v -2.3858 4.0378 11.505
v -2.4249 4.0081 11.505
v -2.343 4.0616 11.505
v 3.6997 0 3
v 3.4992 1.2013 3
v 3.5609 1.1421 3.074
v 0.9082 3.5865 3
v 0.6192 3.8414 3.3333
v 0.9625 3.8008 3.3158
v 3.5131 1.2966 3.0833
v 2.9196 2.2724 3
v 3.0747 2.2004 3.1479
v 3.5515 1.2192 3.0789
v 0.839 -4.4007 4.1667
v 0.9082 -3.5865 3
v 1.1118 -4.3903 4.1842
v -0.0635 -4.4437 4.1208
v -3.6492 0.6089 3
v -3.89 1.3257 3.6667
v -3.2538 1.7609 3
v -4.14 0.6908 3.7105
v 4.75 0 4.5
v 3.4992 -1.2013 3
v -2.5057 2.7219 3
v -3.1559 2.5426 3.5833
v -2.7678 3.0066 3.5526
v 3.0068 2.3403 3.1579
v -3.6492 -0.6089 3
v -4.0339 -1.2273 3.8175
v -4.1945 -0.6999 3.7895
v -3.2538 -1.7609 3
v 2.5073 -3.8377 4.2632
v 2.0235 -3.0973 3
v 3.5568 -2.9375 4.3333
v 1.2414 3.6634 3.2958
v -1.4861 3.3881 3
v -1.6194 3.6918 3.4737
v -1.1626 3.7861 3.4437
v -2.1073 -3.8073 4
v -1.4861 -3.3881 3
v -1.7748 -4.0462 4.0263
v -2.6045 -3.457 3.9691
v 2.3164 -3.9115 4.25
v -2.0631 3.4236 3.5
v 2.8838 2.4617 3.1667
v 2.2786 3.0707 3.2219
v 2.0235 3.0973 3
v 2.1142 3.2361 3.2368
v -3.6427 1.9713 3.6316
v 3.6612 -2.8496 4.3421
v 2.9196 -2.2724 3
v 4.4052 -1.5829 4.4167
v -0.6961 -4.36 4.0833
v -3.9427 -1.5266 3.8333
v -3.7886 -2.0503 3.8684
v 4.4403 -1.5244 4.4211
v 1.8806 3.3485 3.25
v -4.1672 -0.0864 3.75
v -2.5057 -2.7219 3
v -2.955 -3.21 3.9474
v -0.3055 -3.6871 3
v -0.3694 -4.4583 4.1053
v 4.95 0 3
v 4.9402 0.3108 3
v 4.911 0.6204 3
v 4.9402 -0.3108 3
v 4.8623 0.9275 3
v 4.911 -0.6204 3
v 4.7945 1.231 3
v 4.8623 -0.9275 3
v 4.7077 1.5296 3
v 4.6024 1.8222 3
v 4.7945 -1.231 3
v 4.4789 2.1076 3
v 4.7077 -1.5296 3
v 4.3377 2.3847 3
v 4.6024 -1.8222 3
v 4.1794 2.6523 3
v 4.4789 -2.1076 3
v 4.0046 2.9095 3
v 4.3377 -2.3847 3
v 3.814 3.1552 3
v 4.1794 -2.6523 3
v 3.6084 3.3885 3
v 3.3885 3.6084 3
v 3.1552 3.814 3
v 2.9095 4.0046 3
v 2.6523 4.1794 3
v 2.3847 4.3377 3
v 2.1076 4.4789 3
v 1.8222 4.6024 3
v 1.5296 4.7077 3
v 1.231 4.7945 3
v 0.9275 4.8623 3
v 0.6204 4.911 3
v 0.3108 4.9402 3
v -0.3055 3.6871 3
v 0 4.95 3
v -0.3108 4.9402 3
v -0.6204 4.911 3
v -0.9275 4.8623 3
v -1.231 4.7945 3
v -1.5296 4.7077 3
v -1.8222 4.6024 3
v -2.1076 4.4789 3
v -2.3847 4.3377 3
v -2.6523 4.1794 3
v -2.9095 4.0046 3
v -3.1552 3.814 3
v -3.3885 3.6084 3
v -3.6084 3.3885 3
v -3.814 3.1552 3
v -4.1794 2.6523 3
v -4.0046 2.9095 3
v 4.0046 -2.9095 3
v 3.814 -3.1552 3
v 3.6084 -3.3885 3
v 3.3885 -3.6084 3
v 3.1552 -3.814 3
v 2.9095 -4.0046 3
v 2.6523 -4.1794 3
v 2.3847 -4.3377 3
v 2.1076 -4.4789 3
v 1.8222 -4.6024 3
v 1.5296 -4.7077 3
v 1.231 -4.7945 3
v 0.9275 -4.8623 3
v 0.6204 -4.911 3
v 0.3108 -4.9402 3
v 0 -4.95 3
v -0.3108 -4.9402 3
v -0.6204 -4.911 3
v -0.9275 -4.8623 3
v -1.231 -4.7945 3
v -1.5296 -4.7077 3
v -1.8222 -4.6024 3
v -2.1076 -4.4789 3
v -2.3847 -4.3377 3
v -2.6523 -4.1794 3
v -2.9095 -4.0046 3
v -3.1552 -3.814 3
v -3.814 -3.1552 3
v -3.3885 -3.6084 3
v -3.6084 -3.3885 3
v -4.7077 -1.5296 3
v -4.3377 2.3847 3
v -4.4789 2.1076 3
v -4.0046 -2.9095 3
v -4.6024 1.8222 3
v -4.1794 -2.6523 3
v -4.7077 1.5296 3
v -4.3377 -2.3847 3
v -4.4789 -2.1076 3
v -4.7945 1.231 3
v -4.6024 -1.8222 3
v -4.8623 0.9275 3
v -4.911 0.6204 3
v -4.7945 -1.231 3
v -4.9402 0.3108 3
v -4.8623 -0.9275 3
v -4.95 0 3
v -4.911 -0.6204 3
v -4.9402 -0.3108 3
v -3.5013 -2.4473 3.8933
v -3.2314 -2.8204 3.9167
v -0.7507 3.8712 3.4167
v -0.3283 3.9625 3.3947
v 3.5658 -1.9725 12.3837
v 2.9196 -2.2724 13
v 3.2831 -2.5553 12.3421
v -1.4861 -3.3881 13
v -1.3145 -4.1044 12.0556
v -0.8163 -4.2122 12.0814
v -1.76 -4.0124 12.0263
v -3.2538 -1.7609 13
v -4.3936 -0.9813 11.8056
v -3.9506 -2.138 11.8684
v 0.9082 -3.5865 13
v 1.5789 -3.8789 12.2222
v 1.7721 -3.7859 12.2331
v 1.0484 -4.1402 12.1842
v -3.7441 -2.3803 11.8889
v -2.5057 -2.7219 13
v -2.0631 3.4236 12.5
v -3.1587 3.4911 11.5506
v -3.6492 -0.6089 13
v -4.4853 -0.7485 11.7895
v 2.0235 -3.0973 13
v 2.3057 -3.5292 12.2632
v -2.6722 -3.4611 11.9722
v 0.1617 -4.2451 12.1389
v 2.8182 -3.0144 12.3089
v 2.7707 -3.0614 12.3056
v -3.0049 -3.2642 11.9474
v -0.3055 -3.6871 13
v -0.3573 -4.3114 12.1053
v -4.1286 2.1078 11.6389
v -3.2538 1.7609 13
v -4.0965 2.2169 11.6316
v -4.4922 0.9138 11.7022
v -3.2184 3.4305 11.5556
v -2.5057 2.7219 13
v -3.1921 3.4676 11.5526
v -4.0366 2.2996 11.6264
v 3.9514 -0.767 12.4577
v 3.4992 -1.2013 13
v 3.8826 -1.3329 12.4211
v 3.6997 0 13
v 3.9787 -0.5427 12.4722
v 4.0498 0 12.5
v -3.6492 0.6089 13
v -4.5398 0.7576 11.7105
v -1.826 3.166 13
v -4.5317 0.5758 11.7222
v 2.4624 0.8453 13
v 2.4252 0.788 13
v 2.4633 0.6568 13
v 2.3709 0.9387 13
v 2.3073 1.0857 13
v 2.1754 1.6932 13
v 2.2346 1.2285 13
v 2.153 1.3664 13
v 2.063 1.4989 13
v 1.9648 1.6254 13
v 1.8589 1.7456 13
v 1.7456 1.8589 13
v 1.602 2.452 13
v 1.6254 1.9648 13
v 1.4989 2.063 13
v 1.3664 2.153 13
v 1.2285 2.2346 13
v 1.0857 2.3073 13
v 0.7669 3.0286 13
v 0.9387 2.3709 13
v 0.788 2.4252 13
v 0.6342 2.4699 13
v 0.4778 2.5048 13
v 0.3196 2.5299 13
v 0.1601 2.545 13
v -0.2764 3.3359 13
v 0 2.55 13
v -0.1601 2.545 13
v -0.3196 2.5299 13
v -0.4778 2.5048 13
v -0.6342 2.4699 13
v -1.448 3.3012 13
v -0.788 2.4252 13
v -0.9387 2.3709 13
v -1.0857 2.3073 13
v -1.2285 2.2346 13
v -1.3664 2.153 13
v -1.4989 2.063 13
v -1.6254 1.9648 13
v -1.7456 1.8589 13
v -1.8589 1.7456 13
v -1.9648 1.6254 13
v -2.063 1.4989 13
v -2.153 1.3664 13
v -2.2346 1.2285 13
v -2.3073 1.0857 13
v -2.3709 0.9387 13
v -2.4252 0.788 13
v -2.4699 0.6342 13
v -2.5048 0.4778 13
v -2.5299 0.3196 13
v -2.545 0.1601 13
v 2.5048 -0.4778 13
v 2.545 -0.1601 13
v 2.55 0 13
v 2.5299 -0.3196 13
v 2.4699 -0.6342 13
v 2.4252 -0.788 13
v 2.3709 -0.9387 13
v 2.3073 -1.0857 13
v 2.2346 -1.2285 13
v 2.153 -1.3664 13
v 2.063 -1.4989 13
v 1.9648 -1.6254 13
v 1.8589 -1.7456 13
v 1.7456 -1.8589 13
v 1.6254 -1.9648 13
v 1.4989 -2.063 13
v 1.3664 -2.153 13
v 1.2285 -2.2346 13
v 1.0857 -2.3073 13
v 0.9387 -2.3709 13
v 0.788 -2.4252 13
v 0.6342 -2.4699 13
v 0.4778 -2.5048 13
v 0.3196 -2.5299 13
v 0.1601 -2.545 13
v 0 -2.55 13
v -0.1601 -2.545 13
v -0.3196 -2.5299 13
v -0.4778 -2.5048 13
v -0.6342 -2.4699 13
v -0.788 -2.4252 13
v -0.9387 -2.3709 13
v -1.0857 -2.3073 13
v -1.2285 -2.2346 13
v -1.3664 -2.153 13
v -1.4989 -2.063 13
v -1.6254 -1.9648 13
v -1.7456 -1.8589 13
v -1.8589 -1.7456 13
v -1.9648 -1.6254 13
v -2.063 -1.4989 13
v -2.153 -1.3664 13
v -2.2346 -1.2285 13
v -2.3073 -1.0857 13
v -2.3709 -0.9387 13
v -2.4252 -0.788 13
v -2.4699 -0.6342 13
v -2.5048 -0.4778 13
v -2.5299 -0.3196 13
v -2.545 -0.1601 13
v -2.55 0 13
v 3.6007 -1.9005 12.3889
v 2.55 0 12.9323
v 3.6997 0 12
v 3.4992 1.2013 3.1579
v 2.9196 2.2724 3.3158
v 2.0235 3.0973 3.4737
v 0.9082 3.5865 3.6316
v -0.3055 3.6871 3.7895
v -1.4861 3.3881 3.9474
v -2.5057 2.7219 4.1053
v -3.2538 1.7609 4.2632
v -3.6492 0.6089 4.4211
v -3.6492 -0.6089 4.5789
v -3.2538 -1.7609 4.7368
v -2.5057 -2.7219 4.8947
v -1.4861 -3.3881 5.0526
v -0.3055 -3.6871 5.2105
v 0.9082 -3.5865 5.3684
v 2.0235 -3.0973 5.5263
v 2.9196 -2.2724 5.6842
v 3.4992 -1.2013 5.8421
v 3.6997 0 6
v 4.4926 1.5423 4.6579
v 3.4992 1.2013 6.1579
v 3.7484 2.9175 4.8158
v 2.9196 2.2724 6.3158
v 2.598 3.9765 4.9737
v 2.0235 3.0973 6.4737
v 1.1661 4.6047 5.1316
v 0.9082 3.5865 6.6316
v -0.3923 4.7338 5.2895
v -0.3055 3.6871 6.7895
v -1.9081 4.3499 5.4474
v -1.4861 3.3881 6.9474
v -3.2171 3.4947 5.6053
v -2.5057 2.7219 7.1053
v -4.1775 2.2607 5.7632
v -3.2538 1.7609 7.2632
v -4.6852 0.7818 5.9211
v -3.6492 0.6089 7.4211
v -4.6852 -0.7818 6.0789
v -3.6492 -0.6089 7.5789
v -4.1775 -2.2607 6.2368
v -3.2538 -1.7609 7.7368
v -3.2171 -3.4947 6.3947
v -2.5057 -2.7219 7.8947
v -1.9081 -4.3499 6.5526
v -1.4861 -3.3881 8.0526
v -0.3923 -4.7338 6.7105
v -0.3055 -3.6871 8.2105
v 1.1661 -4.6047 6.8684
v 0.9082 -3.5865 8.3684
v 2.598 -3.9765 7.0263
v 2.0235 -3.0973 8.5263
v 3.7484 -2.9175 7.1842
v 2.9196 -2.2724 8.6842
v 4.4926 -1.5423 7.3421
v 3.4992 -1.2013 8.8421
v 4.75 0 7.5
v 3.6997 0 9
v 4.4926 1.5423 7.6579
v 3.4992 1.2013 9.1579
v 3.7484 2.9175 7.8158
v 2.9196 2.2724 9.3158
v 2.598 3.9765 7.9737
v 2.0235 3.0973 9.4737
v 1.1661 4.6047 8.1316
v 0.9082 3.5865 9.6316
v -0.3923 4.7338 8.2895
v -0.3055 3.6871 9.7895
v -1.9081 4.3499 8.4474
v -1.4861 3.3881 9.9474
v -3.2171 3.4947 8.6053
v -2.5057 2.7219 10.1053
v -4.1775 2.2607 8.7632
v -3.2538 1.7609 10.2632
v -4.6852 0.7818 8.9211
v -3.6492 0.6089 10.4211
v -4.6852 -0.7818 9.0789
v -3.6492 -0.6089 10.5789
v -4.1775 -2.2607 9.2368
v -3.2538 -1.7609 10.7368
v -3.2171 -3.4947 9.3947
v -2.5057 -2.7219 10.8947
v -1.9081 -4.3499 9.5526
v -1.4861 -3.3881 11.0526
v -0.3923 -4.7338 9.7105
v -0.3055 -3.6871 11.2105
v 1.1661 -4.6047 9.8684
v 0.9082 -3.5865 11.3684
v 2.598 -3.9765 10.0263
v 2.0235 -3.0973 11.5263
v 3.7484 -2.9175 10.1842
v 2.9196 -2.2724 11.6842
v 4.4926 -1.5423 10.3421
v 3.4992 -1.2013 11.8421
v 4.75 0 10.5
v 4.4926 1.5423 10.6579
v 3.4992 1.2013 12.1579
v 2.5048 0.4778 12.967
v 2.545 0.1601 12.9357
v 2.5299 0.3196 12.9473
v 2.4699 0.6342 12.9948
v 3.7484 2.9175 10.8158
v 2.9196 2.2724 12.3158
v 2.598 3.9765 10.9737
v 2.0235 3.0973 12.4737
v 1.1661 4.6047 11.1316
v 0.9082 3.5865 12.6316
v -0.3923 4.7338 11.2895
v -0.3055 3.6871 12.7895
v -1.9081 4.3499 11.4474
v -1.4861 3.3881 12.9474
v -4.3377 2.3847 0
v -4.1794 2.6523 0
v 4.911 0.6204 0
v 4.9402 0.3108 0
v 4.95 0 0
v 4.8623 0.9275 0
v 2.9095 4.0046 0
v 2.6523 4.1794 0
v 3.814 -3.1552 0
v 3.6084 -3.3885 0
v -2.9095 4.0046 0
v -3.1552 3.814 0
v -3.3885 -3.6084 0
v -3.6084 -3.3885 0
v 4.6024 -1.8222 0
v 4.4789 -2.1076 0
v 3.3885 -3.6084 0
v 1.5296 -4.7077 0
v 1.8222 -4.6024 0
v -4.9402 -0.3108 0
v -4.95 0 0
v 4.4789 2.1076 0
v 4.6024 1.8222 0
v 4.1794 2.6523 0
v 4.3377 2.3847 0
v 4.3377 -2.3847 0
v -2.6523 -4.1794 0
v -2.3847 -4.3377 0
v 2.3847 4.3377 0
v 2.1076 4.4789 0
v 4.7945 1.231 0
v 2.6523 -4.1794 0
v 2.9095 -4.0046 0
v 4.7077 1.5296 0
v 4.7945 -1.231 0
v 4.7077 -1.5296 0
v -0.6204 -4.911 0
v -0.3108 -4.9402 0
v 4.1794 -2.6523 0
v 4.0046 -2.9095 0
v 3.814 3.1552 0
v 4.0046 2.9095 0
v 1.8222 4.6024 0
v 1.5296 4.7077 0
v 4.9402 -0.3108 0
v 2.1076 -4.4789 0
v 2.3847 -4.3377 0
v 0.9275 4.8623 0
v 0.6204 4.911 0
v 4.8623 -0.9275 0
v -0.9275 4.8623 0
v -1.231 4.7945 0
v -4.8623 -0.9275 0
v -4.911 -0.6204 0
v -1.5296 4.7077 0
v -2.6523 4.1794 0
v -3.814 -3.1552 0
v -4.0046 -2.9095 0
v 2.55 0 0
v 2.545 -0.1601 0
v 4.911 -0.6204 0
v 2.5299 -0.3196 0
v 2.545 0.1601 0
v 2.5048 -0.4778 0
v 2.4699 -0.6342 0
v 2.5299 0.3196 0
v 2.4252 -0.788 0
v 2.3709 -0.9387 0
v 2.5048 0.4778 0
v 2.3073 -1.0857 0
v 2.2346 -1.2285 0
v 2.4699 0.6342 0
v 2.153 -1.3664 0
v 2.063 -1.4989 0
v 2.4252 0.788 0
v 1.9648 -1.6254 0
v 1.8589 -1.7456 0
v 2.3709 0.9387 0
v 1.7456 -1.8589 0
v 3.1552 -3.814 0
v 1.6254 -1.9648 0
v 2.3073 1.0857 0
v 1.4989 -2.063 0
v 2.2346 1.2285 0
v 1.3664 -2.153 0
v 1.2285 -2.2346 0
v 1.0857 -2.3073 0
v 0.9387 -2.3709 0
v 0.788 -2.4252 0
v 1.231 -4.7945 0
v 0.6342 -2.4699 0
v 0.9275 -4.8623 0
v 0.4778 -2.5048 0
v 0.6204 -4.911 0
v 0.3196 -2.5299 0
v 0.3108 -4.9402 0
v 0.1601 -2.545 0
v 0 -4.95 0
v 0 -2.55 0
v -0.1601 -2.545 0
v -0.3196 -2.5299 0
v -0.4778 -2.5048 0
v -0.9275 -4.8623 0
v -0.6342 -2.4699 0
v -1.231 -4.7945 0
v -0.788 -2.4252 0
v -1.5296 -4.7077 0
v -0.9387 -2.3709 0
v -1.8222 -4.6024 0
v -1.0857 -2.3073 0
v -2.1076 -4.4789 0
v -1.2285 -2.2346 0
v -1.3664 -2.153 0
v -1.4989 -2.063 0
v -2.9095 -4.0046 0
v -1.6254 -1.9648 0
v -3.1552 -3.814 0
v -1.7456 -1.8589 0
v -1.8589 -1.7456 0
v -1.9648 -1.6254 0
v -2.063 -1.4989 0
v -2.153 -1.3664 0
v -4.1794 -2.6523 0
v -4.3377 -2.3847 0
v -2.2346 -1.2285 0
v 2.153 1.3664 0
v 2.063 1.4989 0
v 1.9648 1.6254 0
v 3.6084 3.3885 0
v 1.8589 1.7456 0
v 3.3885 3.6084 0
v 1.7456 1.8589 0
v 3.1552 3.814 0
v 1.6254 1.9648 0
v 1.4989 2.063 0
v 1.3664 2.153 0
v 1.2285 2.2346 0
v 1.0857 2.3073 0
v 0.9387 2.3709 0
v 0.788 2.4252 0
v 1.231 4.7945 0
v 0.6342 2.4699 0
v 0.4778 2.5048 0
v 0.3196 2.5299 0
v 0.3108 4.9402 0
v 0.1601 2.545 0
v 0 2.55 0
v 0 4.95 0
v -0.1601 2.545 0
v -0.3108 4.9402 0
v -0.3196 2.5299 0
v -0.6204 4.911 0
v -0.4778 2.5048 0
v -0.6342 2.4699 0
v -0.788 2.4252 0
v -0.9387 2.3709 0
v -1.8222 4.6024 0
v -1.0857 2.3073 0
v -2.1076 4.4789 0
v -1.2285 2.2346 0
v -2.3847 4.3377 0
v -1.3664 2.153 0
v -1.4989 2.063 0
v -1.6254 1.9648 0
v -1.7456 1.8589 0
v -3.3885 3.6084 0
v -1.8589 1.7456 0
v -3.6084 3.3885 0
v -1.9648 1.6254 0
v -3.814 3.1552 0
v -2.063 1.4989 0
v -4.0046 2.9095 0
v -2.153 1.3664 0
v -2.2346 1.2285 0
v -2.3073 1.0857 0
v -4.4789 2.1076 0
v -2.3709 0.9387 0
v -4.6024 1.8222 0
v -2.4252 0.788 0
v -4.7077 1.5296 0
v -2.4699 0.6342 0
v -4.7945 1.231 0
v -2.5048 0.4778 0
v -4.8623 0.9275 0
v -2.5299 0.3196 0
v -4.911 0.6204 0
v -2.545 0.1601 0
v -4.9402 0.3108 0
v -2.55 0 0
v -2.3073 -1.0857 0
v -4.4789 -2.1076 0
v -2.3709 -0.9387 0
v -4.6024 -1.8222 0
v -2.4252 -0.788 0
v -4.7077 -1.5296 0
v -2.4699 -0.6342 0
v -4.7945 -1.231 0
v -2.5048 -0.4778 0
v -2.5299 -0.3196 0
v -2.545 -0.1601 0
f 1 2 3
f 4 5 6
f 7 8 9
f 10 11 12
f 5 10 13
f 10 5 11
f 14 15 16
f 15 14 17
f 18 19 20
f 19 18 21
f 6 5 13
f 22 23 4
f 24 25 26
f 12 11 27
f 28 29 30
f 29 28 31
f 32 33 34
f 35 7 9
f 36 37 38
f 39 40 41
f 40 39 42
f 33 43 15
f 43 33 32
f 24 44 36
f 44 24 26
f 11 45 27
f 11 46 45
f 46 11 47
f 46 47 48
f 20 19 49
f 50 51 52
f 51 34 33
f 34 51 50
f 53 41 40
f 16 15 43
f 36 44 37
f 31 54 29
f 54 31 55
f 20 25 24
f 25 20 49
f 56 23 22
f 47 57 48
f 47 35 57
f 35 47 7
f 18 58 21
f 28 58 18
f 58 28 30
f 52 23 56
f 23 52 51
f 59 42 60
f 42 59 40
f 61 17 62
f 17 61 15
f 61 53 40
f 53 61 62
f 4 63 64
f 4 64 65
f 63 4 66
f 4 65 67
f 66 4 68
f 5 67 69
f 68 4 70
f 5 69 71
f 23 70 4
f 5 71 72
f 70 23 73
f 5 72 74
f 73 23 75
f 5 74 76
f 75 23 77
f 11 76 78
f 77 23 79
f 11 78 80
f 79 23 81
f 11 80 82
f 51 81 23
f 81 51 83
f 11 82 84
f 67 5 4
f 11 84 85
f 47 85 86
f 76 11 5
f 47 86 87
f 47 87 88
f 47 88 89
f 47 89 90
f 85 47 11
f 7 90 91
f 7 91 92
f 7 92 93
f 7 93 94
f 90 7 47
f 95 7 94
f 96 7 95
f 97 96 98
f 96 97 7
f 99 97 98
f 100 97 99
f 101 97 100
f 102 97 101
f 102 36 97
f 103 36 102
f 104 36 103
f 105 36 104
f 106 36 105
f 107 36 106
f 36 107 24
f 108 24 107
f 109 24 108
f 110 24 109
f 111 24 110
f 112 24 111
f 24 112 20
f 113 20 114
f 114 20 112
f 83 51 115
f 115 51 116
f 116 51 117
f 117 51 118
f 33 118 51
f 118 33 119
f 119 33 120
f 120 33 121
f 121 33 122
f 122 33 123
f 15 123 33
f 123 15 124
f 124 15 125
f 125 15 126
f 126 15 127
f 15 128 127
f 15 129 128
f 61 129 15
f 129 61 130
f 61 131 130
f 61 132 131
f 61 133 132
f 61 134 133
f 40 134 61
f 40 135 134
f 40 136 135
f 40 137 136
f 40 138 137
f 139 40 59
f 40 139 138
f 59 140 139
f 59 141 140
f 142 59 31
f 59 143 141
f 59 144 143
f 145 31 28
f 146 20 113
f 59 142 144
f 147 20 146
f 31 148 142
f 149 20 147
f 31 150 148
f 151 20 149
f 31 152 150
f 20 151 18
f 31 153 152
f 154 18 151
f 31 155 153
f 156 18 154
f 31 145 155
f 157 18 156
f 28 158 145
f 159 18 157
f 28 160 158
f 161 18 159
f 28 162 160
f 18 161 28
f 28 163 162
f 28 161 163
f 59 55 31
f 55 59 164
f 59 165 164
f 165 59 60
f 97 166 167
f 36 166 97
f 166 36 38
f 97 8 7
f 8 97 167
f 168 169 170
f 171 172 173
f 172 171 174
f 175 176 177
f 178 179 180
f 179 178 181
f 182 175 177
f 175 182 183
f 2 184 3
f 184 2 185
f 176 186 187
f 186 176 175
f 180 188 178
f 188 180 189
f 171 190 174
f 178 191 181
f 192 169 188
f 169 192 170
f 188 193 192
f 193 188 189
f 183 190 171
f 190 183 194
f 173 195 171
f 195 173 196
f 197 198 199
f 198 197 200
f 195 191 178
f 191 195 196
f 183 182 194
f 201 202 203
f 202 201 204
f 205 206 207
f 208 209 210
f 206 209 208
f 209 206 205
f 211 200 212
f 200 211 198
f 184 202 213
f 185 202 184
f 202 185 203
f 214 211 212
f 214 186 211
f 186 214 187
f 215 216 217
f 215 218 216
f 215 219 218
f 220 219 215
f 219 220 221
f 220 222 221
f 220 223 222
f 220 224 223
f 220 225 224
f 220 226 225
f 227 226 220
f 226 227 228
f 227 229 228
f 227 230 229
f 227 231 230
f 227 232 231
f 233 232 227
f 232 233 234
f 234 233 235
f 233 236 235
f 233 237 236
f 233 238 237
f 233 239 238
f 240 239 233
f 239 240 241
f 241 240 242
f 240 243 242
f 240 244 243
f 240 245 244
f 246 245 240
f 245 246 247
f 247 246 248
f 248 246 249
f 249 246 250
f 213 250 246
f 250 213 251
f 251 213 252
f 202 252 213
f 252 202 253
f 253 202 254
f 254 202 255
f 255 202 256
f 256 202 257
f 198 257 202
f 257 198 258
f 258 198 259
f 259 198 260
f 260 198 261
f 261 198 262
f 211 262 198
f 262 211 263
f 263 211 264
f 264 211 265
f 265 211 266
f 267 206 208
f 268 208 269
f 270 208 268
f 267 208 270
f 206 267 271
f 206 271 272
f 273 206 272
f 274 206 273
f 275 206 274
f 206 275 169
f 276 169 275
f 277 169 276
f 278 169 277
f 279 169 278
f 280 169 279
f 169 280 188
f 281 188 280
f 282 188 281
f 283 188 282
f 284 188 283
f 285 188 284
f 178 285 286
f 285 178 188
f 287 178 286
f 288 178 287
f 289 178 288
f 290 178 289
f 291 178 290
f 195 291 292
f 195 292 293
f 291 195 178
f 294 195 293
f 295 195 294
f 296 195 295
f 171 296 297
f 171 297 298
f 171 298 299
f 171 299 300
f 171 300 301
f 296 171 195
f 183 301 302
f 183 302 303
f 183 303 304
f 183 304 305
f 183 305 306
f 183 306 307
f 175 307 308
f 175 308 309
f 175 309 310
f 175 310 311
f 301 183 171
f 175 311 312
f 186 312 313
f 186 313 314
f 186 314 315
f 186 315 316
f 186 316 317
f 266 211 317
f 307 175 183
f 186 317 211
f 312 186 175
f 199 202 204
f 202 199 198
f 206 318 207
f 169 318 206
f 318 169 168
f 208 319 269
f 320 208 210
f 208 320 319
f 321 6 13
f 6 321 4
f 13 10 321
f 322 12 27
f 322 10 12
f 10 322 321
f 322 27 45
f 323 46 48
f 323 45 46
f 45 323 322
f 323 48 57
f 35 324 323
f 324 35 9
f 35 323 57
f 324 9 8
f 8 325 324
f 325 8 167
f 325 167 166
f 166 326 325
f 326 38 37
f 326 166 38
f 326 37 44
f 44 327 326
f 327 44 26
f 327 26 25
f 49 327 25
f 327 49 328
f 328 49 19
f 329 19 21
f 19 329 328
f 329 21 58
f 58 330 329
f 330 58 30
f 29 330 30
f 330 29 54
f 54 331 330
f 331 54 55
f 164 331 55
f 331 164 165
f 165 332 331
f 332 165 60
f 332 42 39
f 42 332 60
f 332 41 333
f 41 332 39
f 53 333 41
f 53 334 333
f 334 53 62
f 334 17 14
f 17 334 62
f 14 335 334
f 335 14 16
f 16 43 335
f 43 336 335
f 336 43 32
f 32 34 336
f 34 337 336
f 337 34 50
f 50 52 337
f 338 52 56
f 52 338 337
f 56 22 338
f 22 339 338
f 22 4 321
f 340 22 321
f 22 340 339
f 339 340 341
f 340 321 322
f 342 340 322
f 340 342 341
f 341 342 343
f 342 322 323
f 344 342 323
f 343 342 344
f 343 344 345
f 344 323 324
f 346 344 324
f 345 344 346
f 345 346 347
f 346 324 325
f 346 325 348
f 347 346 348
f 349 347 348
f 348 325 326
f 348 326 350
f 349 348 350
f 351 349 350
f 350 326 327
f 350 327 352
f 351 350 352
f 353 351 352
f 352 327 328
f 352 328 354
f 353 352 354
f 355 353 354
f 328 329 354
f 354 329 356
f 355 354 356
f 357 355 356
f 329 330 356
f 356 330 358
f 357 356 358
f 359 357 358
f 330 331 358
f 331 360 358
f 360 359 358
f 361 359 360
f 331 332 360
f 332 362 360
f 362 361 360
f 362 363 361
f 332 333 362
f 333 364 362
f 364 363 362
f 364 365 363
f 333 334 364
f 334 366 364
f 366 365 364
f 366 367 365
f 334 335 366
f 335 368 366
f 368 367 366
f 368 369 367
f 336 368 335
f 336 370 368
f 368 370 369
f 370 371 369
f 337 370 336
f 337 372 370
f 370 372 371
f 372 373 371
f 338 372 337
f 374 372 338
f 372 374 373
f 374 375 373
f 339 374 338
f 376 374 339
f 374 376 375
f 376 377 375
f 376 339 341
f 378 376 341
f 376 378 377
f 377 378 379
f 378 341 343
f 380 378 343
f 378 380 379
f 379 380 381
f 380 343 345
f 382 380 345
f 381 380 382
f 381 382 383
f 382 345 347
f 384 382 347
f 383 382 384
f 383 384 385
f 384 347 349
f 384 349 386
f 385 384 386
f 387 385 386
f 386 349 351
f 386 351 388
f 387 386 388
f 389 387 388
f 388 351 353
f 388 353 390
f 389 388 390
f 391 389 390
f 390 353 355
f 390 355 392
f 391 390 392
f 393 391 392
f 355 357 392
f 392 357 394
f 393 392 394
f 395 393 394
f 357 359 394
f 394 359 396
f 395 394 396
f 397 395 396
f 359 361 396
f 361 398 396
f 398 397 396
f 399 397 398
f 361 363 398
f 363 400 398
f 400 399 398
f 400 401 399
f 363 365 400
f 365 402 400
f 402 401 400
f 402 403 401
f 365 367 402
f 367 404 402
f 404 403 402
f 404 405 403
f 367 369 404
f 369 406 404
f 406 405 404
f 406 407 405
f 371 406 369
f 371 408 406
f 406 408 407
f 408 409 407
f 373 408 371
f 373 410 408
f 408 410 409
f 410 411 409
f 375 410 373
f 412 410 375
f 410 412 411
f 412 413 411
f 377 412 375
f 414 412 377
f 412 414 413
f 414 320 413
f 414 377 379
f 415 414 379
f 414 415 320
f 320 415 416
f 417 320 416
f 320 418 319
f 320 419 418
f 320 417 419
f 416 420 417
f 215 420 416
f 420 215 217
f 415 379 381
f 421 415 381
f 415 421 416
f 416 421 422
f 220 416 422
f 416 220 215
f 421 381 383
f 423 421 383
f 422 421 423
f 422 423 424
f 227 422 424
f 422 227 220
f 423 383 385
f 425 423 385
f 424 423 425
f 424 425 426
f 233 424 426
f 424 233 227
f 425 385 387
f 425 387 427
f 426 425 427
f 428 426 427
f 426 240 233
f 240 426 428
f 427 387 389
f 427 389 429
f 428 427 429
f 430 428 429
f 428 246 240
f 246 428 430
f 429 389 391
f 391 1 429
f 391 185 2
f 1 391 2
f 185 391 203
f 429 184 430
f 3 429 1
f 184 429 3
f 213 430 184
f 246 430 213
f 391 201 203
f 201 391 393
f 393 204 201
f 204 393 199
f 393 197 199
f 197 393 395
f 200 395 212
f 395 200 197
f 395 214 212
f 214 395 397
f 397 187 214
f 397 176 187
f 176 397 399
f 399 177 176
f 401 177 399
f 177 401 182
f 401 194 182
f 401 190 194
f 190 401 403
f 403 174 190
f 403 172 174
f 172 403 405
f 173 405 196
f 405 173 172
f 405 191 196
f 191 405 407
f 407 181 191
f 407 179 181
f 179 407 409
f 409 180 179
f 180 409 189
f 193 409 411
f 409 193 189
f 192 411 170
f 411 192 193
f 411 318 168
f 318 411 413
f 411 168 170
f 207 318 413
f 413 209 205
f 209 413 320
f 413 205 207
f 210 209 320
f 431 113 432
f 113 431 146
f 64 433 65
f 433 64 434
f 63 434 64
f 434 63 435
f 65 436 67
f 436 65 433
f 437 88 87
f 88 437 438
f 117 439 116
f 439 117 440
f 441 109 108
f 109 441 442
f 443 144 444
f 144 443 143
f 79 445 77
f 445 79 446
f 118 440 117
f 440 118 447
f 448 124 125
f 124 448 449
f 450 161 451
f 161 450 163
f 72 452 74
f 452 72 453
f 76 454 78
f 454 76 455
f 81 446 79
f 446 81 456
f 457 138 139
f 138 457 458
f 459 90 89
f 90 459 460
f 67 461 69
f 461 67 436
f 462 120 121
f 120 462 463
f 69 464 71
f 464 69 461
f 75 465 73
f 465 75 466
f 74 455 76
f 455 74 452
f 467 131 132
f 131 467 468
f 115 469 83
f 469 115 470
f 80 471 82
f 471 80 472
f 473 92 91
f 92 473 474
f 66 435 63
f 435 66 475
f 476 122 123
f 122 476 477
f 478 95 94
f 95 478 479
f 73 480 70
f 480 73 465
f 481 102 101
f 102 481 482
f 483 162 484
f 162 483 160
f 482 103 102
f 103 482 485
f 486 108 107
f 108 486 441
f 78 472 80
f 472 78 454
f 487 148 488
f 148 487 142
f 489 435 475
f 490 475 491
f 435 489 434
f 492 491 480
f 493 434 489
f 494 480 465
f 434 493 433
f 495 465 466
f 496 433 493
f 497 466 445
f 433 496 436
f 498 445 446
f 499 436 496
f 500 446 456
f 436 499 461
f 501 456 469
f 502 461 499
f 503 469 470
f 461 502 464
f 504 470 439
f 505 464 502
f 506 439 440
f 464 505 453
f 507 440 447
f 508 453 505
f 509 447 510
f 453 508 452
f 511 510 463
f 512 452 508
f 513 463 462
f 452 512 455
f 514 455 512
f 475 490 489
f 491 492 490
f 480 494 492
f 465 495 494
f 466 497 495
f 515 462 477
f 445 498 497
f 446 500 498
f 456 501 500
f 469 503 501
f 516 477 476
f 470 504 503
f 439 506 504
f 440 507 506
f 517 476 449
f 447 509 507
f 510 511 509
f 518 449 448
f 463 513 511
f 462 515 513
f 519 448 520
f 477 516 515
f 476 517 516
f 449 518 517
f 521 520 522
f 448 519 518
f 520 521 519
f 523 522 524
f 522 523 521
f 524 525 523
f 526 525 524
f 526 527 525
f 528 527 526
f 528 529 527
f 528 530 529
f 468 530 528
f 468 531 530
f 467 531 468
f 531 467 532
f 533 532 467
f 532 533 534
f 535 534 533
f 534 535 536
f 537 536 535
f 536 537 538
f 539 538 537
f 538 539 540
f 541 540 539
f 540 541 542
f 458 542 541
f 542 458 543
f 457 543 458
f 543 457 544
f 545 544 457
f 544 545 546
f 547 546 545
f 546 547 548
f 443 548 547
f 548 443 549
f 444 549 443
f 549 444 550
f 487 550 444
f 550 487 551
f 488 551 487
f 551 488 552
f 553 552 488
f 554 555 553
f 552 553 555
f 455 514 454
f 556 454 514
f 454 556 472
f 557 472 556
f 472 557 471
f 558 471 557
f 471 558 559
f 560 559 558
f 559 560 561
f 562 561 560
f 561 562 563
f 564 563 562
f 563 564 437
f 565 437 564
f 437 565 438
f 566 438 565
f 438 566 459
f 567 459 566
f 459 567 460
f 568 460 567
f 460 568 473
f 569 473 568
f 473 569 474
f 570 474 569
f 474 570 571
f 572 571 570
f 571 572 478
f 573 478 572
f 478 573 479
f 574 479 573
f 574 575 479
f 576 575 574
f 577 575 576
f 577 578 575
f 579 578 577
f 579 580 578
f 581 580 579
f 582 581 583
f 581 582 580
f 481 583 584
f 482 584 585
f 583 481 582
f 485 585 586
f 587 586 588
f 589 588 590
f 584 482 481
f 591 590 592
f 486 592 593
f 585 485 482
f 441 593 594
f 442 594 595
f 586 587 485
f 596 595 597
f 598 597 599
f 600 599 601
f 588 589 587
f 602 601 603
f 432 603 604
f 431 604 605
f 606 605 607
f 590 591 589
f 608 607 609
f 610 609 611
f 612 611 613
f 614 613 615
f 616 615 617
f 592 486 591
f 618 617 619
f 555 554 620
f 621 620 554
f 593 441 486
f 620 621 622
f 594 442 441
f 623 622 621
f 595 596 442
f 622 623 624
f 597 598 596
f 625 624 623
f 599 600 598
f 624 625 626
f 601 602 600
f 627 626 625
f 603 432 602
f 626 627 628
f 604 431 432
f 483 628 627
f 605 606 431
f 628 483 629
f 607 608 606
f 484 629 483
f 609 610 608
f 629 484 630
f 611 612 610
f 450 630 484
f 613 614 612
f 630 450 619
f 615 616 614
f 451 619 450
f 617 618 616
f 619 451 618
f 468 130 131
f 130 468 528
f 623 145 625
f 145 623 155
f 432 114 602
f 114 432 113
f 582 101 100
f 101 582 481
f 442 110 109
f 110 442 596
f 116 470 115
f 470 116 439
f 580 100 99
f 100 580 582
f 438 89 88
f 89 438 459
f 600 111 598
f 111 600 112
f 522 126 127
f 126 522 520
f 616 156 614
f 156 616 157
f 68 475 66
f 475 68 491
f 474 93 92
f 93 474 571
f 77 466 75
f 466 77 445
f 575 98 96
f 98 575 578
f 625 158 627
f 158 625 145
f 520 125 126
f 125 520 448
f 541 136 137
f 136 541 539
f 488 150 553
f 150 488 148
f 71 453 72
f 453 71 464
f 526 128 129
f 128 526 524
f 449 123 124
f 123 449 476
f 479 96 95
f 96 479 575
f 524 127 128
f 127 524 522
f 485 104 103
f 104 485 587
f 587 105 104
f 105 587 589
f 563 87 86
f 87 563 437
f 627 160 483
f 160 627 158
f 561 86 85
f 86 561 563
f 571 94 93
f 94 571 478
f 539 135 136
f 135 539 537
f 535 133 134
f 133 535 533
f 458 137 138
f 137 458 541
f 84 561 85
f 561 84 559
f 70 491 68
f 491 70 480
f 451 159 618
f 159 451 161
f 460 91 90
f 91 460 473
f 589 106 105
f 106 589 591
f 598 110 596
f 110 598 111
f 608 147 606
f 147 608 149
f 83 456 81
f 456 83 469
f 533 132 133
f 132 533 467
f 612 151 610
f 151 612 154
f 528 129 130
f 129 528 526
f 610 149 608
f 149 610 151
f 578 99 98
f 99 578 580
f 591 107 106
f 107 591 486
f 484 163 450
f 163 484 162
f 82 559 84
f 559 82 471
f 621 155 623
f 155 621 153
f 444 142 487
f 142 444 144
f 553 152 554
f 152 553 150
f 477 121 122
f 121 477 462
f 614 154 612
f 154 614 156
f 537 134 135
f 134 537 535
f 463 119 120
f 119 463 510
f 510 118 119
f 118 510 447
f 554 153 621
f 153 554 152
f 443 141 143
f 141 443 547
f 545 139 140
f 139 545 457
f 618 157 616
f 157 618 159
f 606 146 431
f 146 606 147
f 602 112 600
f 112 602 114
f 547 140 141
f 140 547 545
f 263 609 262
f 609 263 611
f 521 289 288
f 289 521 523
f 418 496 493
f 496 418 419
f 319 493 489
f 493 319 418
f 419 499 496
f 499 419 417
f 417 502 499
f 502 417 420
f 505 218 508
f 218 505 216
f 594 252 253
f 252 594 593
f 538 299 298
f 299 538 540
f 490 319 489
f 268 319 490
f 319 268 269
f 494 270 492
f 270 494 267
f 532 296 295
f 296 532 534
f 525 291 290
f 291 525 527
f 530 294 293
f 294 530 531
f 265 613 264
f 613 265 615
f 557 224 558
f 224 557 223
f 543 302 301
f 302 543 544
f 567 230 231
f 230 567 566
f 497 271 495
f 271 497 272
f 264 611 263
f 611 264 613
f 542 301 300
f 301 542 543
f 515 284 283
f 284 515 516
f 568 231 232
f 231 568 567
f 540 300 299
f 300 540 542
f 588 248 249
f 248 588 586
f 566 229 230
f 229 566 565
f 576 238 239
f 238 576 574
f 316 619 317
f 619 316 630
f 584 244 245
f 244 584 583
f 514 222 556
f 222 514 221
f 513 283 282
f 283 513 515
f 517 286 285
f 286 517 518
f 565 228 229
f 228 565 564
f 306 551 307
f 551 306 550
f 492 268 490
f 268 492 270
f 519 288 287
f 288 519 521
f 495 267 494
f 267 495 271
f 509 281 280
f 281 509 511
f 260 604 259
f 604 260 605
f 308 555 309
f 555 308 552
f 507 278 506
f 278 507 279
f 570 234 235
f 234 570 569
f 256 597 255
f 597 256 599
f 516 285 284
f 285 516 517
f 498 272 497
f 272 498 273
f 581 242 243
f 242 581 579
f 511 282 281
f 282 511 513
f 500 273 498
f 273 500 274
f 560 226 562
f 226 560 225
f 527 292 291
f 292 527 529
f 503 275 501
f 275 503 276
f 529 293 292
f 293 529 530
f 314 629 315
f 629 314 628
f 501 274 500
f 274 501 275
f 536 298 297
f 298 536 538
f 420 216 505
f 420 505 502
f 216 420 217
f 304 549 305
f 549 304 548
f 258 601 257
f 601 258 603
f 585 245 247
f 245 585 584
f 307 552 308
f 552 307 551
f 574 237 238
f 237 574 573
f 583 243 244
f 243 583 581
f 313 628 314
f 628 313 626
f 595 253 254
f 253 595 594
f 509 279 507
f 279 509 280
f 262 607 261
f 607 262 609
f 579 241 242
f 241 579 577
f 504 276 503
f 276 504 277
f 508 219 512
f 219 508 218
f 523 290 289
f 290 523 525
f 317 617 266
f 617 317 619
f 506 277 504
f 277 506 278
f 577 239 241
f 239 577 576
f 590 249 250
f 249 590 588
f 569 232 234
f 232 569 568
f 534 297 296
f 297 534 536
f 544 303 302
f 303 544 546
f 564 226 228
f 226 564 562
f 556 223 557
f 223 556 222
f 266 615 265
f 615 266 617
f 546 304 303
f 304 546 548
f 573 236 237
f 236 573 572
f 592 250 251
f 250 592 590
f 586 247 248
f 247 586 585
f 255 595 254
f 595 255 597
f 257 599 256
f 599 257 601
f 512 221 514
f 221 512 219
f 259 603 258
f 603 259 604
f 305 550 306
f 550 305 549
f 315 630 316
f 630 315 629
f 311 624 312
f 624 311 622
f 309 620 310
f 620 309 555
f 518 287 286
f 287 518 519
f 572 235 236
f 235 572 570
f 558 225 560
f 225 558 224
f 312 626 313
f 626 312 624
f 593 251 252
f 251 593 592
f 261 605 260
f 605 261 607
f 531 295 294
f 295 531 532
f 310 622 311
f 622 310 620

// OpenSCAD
// file: ../SRC/polyScrewThread_r1.scad
/*
 *    polyScrewThread_r1.scad    by aubenc @ Thingiverse
 *
 * This script contains the library modules that can be used to generate
 * threaded rods, screws and nuts.
 *
 * http://www.thingiverse.com/thing:8796
 *
 * CC Public Domain
 */


/* Example:
 * Just a 100mm long threaded rod.
 *
 * screw_thread(15,   // Outer diameter of the thread
 *               4,   // Step, traveling length per turn, also, tooth height, whatever...
 *              55,   // Degrees for the shape of the tooth 
 *                       (XY plane = 0, Z = 90, btw, 0 and 90 will/should not work...)
 *             100,   // Length (Z) of the tread
 *            PI/2,   // Resolution, one face each "PI/2" mm of the perimeter, 
 *               0);  // Countersink style:
 *                         -2 - Not even flat ends
 *                         -1 - Bottom (countersink'd and top flat)
 *                          0 - None (top and bottom flat)
 *                          1 - Top (bottom flat)
 *                          2 - Both (countersink'd)
 */
module screw_thread(od,st,lf0,lt,rs,cs)
{
    or=od/2;
    ir=or-st/2*cos(lf0)/sin(lf0);
    pf=2*PI*or;
    sn=floor(pf/rs);
    lfxy=360/sn;
    ttn=round(lt/st+1);
    zt=st/sn;

    intersection()
    {
        if (cs >= -1)
        {
           thread_shape(cs,lt,or,ir,sn,st);
        }

        full_thread(ttn,st,sn,zt,lfxy,or,ir);
    }
}

/* Example.
 * A nut for the thread rod example.
 *
 * hexa_nut(24,  // Distance between flats
 *           8,  // Height 
 *           4,  // Step height (the half will be used to countersink the ends)
 *          55,  // Degrees (same as used for the screw_thread example)
 *          15,  // Outer diameter of the thread to match
 *         0.5)  // Resolution, you may want to set this to small values
 *                  (quite high res) to minimize overhang issues
 *
 */
module hex_nut(df,hg,sth,clf,cod,crs)
{

    difference()
    {
        hex_head(hg,df);

        hex_countersink_ends(sth/2,cod,clf,crs,hg);

        screw_thread(cod,sth,clf,hg,crs,-2);
    }
}


module hex_screw(od,st,lf0,lt,rs,cs,df,hg,ntl,ntd)
{
    ntr=od/2-(st/2)*cos(lf0)/sin(lf0);

    union()
    {
        hex_head(hg,df);

        translate([0,0,hg])
        if ( ntl == 0 )
        {
            cylinder(h=0.01, r=ntr, center=true);
        }
        else
        {
            if ( ntd == -1 )
            {
                cylinder(h=ntl+0.01, r=ntr, $fn=floor(od*PI/rs), center=false);
            }
            else if ( ntd == 0 )
            {
                union()
                {
                    cylinder(h=ntl-st/2,
                             r=od/2, $fn=floor(od*PI/rs), center=false);

                    translate([0,0,ntl-st/2])
                    cylinder(h=st/2,
                             r1=od/2, r2=ntr, 
                             $fn=floor(od*PI/rs), center=false);
                }
            }
            else
            {
                cylinder(h=ntl, r=ntd/2, $fn=ntd*PI/rs, center=false);
            }
        }

        translate([0,0,ntl+hg]) screw_thread(od,st,lf0,lt,rs,cs);
    }
}

module hex_screw_0(od,st,lf0,lt,rs,cs,df,hg,ntl,ntd)
{
    ntr=od/2-(st/2)*cos(lf0)/sin(lf0);

    union()
    {
        hex_head_0(hg,df);

        translate([0,0,hg])
        if ( ntl == 0 )
        {
            cylinder(h=0.01, r=ntr, center=true);
        }
        else
        {
            if ( ntd == -1 )
            {
                cylinder(h=ntl+0.01, r=ntr, $fn=floor(od*PI/rs), center=false);
            }
            else if ( ntd == 0 )
            {
                union()
                {
                    cylinder(h=ntl-st/2,
                             r=od/2, $fn=floor(od*PI/rs), center=false);

                    translate([0,0,ntl-st/2])
                    cylinder(h=st/2,
                             r1=od/2, r2=ntr, 
                             $fn=floor(od*PI/rs), center=false);
                }
            }
            else
            {
                cylinder(h=ntl, r=ntd/2, $fn=ntd*PI/rs, center=false);
            }
        }

        translate([0,0,ntl+hg]) screw_thread(od,st,lf0,lt,rs,cs);
    }
}

module thread_shape(cs,lt,or,ir,sn,st)
{
    if ( cs == 0 )
    {
        cylinder(h=lt, r=or, $fn=sn, center=false);
    }
    else
    {
        union()
        {
            translate([0,0,st/2])
              cylinder(h=lt-st+0.005, r=or, $fn=sn, center=false);

            if ( cs == -1 || cs == 2 )
            {
                cylinder(h=st/2, r1=ir, r2=or, $fn=sn, center=false);
            }
            else
            {
                cylinder(h=st/2, r=or, $fn=sn, center=false);
            }

            translate([0,0,lt-st/2])
            if ( cs == 1 || cs == 2 )
            {
                  cylinder(h=st/2, r1=or, r2=ir, $fn=sn, center=false);
            }
            else
            {
                cylinder(h=st/2, r=or, $fn=sn, center=false);
            }
        }
    }
}

module full_thread(ttn,st,sn,zt,lfxy,or,ir)
{
  if(ir >= 0.2)
  {
    for(i=[0:ttn-1])
    {
        for(j=[0:sn-1])
			assign( pt = [	[0,                  0,                  i*st-st            ],
                        [ir*cos(j*lfxy),     ir*sin(j*lfxy),     i*st+j*zt-st       ],
                        [ir*cos((j+1)*lfxy), ir*sin((j+1)*lfxy), i*st+(j+1)*zt-st   ],
								[0,0,i*st],
                        [or*cos(j*lfxy),     or*sin(j*lfxy),     i*st+j*zt-st/2     ],
                        [or*cos((j+1)*lfxy), or*sin((j+1)*lfxy), i*st+(j+1)*zt-st/2 ],
                        [ir*cos(j*lfxy),     ir*sin(j*lfxy),     i*st+j*zt          ],
                        [ir*cos((j+1)*lfxy), ir*sin((j+1)*lfxy), i*st+(j+1)*zt      ],
                        [0,                  0,                  i*st+st            ]	])
        {
            polyhedron(points=pt,
              		  triangles=[	[1,0,3],[1,3,6],[6,3,8],[1,6,4],
											[0,1,2],[1,4,2],[2,4,5],[5,4,6],[5,6,7],[7,6,8],
											[7,8,3],[0,2,3],[3,2,7],[7,2,5]	]);
        }
    }
  }
  else
  {
    echo("Step Degrees too agresive, the thread will not be made!!");
    echo("Try to increase de value for the degrees and/or...");
    echo(" decrease the pitch value and/or...");
    echo(" increase the outer diameter value.");
  }
}

module hex_head(hg,df)
{
	rd0=df/2/sin(60);
	x0=0;	x1=df/2;	x2=x1+hg/2;
	y0=0;	y1=hg/2;	y2=hg;

	intersection()
	{
	   cylinder(h=hg, r=rd0, $fn=6, center=false);

		rotate_extrude(convexity=10, $fn=6*round(df*PI/6/0.5))
		polygon([ [x0,y0],[x1,y0],[x2,y1],[x1,y2],[x0,y2] ]);
	}
}

module hex_head_0(hg,df)
{
    cylinder(h=hg, r=df/2/sin(60), $fn=6, center=false);
}

module hex_countersink_ends(chg,cod,clf,crs,hg)
{
    translate([0,0,-0.1])
    cylinder(h=chg+0.01, 
             r1=cod/2, 
             r2=cod/2-(chg+0.1)*cos(clf)/sin(clf),
             $fn=floor(cod*PI/crs), center=false);

    translate([0,0,hg-chg+0.1])
    cylinder(h=chg+0.01, 
             r1=cod/2-(chg+0.1)*cos(clf)/sin(clf),
             r2=cod/2, 
             $fn=floor(cod*PI/crs), center=false);
}
// file: ../SRC/WINDGAUGE02A_R02.scad
$fn=100; // model faces resolution.
include <../configuration.scad>

include <polyScrewThread_r1.scad>
PI=3.141592;

WINDGAUGE02A_R02();

module WINDGAUGE02A_R02()
    {
        //setihrana matice
          difference()
        {
            
            union()
            {
        //závit
    screw_thread((11-S01_tolerance_zavit),3,55,R01_vyska_preryti_statoru,PI/2,2);  
                
                
    //spodní podložka        
            translate([0,0,-R01_mezera_mezi_statorem_rotorem/2])    
    cylinder (h = R01_mezera_mezi_statorem_rotorem, r=(lozisko_prumer_vnitrni+2*lozisko_prekryv+2)/2, center = true, $fn=100);     
                }
        
            
       
  
           
 //otvor  
translate([0,0,-R01_mezera_mezi_statorem_rotorem-0.05])        
cylinder (h = R01_vyska_preryti_statoru+R01_mezera_mezi_statorem_rotorem+0.1, r=prumer_osicky/2, $fn=100);
              
              
              
    
 }


}
// file: ../configuration.scad
$fn=40; // model faces resolution.

//OBECNE PARAMETRY 
//----------------------------------------------------------------
//----------------------------------------------------------------
//WINDGAUGE02A_S02 - Parametry pro hlavni valec anemometru
S01_hloubka_zavitu=4;
S01_vyska=80; //80
S01_prumer_vnitrni=46;
S01_sila_materialu=1.2;
S01_vyska_horni_zavit=10;
S01_vyska_spodniho_zavitu=10;
S01_sila_drzaku_RJ11=3; //vyška drážky
S01_hrana_A_RJ11=12.3;
S01_hrana_B_RJ11=19;
S01_tolerance_zavit=1.5;

//Rozměry ložiska se závity
//LO_spodni_prumer=22;
LO_spodni_prumer=17.2; //bez krytu
LO_vyska_bez_krytu=15;
LO_doraz_prumer=44.3;
LO_horni_prumer=7.7;
LO_vyska_spodni_doraz=5;
LO_vyska_horni_doraz=9;
LO_vyska_dorazu=0;





//Obecné parametry
prumer_osicky=5.1;

//Rozmery modulu se senzorem
senzor_delka=22;
senzor_sirka=20.4;
senzor_sila=2;


//Parametry loziska
lozisko_prumer_vnitrni=4.9;
lozisko_prumer_vnejsi=16.1;
lozisko_vyska=5;
lozisko_prekryv=1.5;

//Parametry magnetu
magnet_prumer=6.3;
magnet_vyska=5;
magnet_zapusteni=2;
magnet_tolerance_prumeru=0.2;

//Parametry sroubu
prumer_sroubu=3.4;
prumer_hlavy_sroubu=6;
vyska_hlavy_sroubu=4;
vyska_matky=3;
sirka_matky=6.7;

sirka_matky_tol=0.175;
prumer_orechu=10;

//WINDGAUGE02A_R01 //pro lopatku
L01_hrana_drzaku_a=10;
L01_hrana_drzaku_b=3;
L01_delka_uchytu=19;
L01_prumer_lopatky=40;
L01_sila_materialu_lopatky=0.9;

//WINDGAUGE02A_D01 //uchyt velky
D01_material_pod_zavitem=5;
D01_material_za_zavitem=3;
D01_material_pred_zavitem=2;
D01_delka_tyce=40;
D01_sirka_tyce=10;

//WINDGAUGE02A_D02 //uchyt na sloup
D02_sila_materialu=6;
D02_vyska_uchytky=40;
D02_prumer_obruby=27; // 3/4 trubka
D02_delka_celeho_uchytu=60;
D02_dotahova_vzdalenost=1.5;
D02_prumer_uchytneho_sroubu=4.2;
D02_sirka_matky=9.1; //pro M4
D02_vyska_matky=3;


//WINDGAUGE02A_R01 //rotor s prekritim statoru
R01_vyska_preryti_statoru=10;
R01_sila_materialu_pro_prekriti=1.3;
R01_mezera_mezi_statorem_rotorem=3;

//WINDGAUGE02A_R03 //drzak magnetu
R05_sirka_matky=10;



R03_prumer_zavitu=40;
R04_zavit_vyska=5;
R02_zavit_vyska=10;
R01_zavit_vyska=5;
R03_mezera_mezi_statorem_rotorem=3;

R02_delka_kridla=45;
R02_vzdalenost_der=25;

R02_delka_vyrovnnavaci_tyce=35;
R02_hrana_drzaku=13;
R02_sila_materialu_pod_tyci=5;
R02_sila_materialu_kridla=1.2;
R02_sila_materialu_kridla_tolerance=0.3;

R05_vyska_kridla=100;
R05_delka_kridla=100;
// main file
$fn=100; // model faces resolution.
include <../configuration.scad>
use <../SRC/WINDGAUGE02A_R02.scad>

translate([0,0,R01_mezera_mezi_statorem_rotorem])
    WINDGAUGE02A_R02();

            
